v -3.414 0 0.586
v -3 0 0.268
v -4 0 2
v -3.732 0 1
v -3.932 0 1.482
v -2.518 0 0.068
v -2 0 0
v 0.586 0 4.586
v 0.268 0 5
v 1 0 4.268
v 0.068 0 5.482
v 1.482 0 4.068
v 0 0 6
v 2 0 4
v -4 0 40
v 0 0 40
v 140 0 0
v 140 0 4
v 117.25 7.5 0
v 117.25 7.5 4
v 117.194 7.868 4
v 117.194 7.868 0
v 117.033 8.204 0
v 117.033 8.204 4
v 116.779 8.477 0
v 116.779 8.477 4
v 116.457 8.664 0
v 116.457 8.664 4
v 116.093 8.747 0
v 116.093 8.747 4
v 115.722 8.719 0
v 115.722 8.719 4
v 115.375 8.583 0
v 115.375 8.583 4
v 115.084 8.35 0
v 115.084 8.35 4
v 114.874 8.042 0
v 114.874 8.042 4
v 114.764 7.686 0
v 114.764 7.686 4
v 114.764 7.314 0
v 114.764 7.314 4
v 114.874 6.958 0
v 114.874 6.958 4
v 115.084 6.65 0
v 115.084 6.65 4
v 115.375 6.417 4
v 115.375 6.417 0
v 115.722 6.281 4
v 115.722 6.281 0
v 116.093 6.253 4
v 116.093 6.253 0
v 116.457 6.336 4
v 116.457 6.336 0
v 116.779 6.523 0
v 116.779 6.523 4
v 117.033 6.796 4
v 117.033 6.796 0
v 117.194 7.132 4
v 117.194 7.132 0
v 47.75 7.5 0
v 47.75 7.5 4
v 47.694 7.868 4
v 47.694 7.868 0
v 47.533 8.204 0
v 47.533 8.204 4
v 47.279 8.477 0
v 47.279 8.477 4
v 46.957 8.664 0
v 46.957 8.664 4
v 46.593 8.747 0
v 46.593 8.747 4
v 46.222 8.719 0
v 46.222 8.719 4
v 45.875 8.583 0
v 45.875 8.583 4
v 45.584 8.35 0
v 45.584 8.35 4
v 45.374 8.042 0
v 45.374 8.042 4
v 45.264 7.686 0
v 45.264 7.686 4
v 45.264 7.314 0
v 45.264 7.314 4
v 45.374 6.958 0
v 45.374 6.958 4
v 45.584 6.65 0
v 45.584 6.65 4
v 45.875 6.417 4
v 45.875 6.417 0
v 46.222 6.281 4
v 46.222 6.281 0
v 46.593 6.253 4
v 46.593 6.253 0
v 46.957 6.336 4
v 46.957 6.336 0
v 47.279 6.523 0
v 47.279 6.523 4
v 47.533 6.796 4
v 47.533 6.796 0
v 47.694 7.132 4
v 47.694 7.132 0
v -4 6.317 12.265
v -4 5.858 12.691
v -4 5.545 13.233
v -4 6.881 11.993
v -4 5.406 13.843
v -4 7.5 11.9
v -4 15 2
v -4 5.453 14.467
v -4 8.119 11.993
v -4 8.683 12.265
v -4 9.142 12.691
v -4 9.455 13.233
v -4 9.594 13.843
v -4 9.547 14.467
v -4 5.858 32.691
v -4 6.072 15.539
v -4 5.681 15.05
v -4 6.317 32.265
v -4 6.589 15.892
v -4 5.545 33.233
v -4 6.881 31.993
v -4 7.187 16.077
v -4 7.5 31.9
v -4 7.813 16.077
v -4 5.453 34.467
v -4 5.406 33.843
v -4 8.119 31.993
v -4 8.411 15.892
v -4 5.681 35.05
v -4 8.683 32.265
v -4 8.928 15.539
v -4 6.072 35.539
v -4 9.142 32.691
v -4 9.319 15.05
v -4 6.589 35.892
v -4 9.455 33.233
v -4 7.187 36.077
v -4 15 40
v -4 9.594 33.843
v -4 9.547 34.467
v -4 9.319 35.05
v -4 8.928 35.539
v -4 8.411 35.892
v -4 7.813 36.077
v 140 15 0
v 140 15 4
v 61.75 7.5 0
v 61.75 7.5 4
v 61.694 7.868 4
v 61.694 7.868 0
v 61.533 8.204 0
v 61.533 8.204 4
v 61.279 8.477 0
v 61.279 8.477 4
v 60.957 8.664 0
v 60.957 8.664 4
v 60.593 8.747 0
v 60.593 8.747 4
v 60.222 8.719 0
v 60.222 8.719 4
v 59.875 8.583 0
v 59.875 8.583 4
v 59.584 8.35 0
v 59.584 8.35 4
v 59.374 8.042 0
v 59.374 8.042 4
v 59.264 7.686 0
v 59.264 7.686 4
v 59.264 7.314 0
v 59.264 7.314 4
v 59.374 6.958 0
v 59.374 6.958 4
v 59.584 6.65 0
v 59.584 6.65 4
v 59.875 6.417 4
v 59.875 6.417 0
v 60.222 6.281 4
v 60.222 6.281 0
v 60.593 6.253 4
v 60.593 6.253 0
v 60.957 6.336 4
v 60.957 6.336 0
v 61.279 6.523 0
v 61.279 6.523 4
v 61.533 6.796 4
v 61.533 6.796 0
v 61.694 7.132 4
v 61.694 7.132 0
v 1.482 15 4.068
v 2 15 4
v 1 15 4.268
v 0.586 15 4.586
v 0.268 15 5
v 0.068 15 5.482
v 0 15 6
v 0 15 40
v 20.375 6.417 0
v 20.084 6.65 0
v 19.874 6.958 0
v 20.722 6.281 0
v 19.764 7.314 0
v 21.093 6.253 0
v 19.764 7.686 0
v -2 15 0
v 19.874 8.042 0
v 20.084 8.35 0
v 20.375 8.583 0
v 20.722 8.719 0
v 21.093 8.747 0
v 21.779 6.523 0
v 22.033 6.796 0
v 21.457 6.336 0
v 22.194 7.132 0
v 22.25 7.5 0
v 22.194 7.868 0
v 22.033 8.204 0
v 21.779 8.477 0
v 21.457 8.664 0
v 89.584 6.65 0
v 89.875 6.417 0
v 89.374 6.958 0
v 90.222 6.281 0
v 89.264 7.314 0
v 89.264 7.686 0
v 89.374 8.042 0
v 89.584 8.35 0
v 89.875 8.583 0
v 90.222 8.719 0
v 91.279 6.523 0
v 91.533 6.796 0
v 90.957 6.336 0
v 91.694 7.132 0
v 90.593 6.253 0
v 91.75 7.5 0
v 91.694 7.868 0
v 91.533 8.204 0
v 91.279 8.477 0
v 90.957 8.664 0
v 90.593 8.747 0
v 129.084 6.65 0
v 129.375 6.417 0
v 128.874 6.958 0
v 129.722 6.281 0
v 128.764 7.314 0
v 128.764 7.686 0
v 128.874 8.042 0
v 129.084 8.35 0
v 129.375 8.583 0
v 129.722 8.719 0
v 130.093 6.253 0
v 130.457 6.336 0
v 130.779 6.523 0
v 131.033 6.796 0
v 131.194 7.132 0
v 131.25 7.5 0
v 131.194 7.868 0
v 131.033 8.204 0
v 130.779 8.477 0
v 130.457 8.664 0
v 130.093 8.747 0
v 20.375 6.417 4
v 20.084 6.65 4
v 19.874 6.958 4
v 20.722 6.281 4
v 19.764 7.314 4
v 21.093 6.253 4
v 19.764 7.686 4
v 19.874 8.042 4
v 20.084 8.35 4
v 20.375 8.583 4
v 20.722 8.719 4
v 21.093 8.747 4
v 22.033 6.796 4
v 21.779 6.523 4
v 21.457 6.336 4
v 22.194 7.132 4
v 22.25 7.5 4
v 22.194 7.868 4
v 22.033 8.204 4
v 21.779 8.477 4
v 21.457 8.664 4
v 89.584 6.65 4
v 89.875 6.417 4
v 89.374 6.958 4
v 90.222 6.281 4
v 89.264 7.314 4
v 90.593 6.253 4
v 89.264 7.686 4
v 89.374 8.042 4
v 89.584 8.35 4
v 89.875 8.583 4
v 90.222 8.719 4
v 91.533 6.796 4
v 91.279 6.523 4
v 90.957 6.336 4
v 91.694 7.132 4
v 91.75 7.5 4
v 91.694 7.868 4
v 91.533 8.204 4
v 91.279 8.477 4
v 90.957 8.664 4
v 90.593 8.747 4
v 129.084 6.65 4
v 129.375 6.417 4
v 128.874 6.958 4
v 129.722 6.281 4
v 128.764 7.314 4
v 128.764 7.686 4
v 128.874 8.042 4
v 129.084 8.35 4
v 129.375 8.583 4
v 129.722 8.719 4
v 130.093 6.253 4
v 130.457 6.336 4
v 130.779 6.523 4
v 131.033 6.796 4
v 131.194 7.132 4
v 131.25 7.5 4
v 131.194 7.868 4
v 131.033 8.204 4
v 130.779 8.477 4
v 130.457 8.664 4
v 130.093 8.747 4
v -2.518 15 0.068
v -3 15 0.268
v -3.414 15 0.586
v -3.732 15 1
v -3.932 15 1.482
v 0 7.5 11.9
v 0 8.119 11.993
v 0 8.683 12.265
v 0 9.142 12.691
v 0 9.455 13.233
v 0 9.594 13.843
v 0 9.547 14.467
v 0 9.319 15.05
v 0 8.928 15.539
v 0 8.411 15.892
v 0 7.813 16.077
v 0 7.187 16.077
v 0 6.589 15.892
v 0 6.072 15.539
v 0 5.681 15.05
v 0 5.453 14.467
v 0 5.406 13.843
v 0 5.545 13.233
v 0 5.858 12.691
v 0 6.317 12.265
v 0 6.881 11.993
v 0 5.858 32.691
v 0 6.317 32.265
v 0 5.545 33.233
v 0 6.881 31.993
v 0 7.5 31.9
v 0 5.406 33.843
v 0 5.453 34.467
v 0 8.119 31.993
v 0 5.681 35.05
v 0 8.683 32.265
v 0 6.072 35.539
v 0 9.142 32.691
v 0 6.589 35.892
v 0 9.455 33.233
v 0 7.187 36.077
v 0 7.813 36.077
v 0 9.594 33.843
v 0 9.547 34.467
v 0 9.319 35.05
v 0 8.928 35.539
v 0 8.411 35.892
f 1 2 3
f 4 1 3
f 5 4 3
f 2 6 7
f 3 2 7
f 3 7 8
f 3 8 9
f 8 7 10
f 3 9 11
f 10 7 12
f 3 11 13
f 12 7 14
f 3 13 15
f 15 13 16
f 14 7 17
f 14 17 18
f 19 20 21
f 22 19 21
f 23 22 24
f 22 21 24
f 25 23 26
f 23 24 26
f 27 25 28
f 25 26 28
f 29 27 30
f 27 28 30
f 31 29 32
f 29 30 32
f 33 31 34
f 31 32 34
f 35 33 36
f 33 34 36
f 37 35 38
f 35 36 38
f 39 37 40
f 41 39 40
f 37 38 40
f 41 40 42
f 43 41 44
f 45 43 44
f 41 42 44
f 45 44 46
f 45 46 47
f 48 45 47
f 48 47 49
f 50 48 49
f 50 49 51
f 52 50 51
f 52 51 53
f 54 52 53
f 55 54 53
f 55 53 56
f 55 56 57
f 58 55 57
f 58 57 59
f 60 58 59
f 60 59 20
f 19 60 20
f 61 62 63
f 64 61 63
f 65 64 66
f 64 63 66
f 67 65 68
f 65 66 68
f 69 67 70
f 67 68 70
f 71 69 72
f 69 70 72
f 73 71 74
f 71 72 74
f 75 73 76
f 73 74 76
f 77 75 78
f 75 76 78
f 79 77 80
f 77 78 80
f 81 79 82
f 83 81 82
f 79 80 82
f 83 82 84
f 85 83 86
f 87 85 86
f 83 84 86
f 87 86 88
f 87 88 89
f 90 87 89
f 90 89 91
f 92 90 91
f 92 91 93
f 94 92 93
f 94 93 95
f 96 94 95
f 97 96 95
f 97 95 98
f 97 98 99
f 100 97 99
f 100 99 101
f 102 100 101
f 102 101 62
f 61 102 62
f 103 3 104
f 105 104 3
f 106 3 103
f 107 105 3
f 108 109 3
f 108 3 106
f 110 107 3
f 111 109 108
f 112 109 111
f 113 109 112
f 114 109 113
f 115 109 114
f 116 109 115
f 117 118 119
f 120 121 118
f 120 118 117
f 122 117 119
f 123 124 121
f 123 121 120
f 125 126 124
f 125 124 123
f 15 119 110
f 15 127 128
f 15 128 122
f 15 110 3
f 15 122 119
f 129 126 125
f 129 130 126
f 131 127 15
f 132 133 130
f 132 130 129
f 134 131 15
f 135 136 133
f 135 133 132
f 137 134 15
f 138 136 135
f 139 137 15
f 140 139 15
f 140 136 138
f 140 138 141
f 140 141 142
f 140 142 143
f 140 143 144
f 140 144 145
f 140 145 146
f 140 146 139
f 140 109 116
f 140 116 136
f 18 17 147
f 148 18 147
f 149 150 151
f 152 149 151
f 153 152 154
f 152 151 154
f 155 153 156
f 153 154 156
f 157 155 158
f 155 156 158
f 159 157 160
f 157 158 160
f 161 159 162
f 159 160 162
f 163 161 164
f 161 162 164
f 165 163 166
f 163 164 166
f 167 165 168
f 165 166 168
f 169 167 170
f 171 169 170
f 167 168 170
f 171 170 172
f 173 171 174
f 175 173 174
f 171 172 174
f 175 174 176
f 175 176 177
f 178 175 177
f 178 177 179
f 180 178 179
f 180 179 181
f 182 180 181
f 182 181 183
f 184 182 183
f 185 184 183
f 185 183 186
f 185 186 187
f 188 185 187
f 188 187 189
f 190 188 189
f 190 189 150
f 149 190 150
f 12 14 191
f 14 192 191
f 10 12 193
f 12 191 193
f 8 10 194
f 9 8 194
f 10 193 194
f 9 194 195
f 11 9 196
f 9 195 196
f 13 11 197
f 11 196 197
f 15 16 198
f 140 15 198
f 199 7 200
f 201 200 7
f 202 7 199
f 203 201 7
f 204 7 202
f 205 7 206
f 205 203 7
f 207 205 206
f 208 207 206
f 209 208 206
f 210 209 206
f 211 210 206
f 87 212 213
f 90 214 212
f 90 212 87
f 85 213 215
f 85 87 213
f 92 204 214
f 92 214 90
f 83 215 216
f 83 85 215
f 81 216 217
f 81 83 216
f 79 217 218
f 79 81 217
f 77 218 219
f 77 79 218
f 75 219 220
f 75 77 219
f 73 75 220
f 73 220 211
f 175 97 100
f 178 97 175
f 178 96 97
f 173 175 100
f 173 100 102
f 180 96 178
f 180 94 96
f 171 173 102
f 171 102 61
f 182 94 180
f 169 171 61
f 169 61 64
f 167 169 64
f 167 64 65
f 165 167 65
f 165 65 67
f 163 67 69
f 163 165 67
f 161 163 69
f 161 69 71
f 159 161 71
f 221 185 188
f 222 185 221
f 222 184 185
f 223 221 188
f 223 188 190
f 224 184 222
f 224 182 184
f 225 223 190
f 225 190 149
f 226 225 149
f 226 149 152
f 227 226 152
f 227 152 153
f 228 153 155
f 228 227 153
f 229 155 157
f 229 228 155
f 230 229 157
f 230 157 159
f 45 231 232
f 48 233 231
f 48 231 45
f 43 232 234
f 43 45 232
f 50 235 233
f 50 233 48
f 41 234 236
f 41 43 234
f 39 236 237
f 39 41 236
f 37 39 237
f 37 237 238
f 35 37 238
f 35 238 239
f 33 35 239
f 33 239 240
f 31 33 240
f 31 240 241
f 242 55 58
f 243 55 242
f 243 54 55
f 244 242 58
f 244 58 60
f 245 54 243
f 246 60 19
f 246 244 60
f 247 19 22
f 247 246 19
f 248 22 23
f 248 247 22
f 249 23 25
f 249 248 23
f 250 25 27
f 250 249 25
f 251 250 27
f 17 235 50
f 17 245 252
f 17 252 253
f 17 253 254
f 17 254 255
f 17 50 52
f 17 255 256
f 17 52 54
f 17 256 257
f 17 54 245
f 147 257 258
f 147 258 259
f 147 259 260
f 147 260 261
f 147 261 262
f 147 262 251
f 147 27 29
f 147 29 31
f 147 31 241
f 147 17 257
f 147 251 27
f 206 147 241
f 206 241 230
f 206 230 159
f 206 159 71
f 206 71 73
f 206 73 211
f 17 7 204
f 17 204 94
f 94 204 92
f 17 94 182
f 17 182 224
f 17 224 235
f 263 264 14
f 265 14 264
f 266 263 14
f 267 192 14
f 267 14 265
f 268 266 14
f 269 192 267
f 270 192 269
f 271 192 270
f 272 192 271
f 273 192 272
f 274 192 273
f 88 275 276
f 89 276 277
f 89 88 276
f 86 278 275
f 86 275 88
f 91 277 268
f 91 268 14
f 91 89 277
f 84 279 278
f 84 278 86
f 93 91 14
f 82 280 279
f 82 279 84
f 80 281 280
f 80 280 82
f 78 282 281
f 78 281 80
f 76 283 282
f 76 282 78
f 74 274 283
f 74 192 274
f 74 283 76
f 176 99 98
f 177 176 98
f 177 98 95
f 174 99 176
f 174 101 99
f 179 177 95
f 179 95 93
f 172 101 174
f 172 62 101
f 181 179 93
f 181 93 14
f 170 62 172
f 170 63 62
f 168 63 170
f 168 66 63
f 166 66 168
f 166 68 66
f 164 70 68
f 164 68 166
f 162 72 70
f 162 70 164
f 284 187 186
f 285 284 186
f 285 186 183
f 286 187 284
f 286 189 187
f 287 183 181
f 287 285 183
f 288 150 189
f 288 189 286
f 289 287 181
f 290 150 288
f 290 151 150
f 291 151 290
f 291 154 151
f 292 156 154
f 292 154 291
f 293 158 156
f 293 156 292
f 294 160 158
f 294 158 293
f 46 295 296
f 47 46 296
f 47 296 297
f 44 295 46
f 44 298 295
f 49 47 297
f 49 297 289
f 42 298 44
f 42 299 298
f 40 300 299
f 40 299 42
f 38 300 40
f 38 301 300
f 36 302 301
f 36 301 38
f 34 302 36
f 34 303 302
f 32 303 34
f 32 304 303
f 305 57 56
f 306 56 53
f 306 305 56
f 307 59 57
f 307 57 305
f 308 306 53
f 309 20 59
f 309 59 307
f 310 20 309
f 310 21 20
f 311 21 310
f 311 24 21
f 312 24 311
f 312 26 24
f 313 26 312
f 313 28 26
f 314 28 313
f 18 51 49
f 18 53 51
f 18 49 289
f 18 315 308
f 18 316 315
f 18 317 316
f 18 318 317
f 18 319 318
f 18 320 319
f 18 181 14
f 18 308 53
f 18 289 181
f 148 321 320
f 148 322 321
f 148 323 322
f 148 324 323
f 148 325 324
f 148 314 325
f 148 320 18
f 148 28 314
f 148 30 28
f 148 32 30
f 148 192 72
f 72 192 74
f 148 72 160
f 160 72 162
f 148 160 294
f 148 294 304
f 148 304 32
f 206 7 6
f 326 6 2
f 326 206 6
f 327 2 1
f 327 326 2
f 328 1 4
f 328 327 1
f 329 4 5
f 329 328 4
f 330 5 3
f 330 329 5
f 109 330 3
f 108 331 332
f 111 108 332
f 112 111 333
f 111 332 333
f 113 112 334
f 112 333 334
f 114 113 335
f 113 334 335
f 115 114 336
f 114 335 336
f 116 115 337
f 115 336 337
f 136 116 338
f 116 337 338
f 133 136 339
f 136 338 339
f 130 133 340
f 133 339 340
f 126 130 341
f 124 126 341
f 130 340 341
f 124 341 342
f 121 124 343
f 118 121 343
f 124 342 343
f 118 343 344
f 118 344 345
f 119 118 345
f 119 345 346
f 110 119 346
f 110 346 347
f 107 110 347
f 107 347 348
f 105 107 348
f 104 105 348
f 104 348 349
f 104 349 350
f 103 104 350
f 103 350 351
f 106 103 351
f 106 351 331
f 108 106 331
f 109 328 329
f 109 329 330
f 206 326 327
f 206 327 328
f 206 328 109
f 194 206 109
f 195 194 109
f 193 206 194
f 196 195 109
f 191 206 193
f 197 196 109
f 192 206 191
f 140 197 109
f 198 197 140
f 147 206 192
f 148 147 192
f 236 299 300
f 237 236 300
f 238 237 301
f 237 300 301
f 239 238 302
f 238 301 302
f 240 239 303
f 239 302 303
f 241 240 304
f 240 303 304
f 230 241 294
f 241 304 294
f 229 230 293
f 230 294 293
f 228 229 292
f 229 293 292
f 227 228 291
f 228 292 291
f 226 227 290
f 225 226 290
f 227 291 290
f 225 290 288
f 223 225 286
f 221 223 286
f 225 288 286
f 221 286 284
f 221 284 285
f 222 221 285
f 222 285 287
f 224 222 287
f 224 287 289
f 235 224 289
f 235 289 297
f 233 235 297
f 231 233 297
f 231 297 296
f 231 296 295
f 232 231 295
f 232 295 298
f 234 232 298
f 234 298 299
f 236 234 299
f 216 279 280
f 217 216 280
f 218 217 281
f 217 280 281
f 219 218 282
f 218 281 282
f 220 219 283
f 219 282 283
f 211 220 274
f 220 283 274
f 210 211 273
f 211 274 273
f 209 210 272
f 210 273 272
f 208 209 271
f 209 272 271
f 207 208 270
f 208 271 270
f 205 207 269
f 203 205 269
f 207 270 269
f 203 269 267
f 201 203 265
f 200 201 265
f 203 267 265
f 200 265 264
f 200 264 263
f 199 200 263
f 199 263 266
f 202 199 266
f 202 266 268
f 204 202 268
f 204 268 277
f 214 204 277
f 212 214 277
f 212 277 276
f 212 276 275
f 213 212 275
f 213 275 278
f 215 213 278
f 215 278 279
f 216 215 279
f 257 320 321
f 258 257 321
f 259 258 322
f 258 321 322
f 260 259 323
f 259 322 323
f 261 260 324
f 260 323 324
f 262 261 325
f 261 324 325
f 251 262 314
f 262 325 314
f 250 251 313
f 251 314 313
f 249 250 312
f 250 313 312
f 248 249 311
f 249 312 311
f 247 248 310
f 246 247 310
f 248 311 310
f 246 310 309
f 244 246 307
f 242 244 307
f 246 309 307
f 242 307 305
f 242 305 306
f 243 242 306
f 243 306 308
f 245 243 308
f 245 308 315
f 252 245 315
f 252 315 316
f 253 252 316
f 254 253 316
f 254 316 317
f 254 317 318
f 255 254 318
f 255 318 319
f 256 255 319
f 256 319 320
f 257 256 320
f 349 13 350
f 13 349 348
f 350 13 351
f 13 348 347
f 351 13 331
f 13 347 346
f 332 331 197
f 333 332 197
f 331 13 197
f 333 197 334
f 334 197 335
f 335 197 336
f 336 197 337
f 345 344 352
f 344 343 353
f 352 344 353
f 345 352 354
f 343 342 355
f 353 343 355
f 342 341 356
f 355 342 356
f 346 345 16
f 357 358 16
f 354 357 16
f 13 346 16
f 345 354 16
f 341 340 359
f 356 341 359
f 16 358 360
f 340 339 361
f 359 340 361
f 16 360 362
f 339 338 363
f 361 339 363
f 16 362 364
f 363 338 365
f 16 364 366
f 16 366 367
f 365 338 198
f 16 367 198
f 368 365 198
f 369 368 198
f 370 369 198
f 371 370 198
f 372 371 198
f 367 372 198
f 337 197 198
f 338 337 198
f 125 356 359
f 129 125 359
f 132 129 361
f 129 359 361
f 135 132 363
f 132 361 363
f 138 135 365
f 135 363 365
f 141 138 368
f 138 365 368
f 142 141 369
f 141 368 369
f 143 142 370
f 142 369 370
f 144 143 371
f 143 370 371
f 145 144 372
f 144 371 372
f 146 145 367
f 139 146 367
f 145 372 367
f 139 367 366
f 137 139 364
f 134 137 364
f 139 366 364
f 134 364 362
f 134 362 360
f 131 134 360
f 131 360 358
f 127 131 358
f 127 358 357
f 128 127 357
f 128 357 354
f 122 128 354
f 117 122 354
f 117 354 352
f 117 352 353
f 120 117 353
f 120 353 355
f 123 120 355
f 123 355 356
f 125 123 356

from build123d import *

# Parameters (mm, degrees)
SKETCH1_W             = 140
SKETCH1_H             = 15
BOSS_EXTRUDE1_DEPTH   = 4
M3X0_5_TAPPED_HOLE1_D = 2.5
SKETCH6_W             = 40
SKETCH6_H             = 15
BOSS_EXTRUDE2_DEPTH   = 4
FILLET1_R             = 2
F_4_0MM_DOWEL_HOLE1_D = 4.2


with BuildPart() as part:
    # Sketch1 → Boss-Extrude1 (new body)
    with BuildSketch(Plane.XY):
        with Locations((70, 7.5)):
            Rectangle(SKETCH1_W, SKETCH1_H)
    extrude(amount=BOSS_EXTRUDE1_DEPTH)

    # M3x0.5 Tapped Hole1 (through all)
    with Locations(Plane(origin=(0, 0, 0), x_dir=(-1, 0, 0), z_dir=(0, 0, -1))):
        with Locations((-130, 7.5), (-116, 7.5), (-90.5, 7.5), (-60.5, 7.5), (-46.5, 7.5), (-21, 7.5)):
            Hole(M3X0_5_TAPPED_HOLE1_D / 2)

    # Sketch6 → Boss-Extrude2 (add)
    with BuildSketch(Plane.ZY):
        with Locations((20, 7.5)):
            Rectangle(SKETCH6_W, SKETCH6_H)
    extrude(amount=BOSS_EXTRUDE2_DEPTH)

    # Fillet1
    fillet1_edges = [part.edges().sort_by_distance(p)[0] for p in [
        (0, 7.5, 4),
        (-4, 7.5, 0),
    ]]
    fillet(fillet1_edges, radius=FILLET1_R)

    # Ø4.0mm Dowel Hole1 (through all)
    with Locations(Plane.ZY.offset(4)):
        with Locations((34, 7.5), (14, 7.5)):
            Hole(F_4_0MM_DOWEL_HOLE1_D / 2)


solid = part.part
